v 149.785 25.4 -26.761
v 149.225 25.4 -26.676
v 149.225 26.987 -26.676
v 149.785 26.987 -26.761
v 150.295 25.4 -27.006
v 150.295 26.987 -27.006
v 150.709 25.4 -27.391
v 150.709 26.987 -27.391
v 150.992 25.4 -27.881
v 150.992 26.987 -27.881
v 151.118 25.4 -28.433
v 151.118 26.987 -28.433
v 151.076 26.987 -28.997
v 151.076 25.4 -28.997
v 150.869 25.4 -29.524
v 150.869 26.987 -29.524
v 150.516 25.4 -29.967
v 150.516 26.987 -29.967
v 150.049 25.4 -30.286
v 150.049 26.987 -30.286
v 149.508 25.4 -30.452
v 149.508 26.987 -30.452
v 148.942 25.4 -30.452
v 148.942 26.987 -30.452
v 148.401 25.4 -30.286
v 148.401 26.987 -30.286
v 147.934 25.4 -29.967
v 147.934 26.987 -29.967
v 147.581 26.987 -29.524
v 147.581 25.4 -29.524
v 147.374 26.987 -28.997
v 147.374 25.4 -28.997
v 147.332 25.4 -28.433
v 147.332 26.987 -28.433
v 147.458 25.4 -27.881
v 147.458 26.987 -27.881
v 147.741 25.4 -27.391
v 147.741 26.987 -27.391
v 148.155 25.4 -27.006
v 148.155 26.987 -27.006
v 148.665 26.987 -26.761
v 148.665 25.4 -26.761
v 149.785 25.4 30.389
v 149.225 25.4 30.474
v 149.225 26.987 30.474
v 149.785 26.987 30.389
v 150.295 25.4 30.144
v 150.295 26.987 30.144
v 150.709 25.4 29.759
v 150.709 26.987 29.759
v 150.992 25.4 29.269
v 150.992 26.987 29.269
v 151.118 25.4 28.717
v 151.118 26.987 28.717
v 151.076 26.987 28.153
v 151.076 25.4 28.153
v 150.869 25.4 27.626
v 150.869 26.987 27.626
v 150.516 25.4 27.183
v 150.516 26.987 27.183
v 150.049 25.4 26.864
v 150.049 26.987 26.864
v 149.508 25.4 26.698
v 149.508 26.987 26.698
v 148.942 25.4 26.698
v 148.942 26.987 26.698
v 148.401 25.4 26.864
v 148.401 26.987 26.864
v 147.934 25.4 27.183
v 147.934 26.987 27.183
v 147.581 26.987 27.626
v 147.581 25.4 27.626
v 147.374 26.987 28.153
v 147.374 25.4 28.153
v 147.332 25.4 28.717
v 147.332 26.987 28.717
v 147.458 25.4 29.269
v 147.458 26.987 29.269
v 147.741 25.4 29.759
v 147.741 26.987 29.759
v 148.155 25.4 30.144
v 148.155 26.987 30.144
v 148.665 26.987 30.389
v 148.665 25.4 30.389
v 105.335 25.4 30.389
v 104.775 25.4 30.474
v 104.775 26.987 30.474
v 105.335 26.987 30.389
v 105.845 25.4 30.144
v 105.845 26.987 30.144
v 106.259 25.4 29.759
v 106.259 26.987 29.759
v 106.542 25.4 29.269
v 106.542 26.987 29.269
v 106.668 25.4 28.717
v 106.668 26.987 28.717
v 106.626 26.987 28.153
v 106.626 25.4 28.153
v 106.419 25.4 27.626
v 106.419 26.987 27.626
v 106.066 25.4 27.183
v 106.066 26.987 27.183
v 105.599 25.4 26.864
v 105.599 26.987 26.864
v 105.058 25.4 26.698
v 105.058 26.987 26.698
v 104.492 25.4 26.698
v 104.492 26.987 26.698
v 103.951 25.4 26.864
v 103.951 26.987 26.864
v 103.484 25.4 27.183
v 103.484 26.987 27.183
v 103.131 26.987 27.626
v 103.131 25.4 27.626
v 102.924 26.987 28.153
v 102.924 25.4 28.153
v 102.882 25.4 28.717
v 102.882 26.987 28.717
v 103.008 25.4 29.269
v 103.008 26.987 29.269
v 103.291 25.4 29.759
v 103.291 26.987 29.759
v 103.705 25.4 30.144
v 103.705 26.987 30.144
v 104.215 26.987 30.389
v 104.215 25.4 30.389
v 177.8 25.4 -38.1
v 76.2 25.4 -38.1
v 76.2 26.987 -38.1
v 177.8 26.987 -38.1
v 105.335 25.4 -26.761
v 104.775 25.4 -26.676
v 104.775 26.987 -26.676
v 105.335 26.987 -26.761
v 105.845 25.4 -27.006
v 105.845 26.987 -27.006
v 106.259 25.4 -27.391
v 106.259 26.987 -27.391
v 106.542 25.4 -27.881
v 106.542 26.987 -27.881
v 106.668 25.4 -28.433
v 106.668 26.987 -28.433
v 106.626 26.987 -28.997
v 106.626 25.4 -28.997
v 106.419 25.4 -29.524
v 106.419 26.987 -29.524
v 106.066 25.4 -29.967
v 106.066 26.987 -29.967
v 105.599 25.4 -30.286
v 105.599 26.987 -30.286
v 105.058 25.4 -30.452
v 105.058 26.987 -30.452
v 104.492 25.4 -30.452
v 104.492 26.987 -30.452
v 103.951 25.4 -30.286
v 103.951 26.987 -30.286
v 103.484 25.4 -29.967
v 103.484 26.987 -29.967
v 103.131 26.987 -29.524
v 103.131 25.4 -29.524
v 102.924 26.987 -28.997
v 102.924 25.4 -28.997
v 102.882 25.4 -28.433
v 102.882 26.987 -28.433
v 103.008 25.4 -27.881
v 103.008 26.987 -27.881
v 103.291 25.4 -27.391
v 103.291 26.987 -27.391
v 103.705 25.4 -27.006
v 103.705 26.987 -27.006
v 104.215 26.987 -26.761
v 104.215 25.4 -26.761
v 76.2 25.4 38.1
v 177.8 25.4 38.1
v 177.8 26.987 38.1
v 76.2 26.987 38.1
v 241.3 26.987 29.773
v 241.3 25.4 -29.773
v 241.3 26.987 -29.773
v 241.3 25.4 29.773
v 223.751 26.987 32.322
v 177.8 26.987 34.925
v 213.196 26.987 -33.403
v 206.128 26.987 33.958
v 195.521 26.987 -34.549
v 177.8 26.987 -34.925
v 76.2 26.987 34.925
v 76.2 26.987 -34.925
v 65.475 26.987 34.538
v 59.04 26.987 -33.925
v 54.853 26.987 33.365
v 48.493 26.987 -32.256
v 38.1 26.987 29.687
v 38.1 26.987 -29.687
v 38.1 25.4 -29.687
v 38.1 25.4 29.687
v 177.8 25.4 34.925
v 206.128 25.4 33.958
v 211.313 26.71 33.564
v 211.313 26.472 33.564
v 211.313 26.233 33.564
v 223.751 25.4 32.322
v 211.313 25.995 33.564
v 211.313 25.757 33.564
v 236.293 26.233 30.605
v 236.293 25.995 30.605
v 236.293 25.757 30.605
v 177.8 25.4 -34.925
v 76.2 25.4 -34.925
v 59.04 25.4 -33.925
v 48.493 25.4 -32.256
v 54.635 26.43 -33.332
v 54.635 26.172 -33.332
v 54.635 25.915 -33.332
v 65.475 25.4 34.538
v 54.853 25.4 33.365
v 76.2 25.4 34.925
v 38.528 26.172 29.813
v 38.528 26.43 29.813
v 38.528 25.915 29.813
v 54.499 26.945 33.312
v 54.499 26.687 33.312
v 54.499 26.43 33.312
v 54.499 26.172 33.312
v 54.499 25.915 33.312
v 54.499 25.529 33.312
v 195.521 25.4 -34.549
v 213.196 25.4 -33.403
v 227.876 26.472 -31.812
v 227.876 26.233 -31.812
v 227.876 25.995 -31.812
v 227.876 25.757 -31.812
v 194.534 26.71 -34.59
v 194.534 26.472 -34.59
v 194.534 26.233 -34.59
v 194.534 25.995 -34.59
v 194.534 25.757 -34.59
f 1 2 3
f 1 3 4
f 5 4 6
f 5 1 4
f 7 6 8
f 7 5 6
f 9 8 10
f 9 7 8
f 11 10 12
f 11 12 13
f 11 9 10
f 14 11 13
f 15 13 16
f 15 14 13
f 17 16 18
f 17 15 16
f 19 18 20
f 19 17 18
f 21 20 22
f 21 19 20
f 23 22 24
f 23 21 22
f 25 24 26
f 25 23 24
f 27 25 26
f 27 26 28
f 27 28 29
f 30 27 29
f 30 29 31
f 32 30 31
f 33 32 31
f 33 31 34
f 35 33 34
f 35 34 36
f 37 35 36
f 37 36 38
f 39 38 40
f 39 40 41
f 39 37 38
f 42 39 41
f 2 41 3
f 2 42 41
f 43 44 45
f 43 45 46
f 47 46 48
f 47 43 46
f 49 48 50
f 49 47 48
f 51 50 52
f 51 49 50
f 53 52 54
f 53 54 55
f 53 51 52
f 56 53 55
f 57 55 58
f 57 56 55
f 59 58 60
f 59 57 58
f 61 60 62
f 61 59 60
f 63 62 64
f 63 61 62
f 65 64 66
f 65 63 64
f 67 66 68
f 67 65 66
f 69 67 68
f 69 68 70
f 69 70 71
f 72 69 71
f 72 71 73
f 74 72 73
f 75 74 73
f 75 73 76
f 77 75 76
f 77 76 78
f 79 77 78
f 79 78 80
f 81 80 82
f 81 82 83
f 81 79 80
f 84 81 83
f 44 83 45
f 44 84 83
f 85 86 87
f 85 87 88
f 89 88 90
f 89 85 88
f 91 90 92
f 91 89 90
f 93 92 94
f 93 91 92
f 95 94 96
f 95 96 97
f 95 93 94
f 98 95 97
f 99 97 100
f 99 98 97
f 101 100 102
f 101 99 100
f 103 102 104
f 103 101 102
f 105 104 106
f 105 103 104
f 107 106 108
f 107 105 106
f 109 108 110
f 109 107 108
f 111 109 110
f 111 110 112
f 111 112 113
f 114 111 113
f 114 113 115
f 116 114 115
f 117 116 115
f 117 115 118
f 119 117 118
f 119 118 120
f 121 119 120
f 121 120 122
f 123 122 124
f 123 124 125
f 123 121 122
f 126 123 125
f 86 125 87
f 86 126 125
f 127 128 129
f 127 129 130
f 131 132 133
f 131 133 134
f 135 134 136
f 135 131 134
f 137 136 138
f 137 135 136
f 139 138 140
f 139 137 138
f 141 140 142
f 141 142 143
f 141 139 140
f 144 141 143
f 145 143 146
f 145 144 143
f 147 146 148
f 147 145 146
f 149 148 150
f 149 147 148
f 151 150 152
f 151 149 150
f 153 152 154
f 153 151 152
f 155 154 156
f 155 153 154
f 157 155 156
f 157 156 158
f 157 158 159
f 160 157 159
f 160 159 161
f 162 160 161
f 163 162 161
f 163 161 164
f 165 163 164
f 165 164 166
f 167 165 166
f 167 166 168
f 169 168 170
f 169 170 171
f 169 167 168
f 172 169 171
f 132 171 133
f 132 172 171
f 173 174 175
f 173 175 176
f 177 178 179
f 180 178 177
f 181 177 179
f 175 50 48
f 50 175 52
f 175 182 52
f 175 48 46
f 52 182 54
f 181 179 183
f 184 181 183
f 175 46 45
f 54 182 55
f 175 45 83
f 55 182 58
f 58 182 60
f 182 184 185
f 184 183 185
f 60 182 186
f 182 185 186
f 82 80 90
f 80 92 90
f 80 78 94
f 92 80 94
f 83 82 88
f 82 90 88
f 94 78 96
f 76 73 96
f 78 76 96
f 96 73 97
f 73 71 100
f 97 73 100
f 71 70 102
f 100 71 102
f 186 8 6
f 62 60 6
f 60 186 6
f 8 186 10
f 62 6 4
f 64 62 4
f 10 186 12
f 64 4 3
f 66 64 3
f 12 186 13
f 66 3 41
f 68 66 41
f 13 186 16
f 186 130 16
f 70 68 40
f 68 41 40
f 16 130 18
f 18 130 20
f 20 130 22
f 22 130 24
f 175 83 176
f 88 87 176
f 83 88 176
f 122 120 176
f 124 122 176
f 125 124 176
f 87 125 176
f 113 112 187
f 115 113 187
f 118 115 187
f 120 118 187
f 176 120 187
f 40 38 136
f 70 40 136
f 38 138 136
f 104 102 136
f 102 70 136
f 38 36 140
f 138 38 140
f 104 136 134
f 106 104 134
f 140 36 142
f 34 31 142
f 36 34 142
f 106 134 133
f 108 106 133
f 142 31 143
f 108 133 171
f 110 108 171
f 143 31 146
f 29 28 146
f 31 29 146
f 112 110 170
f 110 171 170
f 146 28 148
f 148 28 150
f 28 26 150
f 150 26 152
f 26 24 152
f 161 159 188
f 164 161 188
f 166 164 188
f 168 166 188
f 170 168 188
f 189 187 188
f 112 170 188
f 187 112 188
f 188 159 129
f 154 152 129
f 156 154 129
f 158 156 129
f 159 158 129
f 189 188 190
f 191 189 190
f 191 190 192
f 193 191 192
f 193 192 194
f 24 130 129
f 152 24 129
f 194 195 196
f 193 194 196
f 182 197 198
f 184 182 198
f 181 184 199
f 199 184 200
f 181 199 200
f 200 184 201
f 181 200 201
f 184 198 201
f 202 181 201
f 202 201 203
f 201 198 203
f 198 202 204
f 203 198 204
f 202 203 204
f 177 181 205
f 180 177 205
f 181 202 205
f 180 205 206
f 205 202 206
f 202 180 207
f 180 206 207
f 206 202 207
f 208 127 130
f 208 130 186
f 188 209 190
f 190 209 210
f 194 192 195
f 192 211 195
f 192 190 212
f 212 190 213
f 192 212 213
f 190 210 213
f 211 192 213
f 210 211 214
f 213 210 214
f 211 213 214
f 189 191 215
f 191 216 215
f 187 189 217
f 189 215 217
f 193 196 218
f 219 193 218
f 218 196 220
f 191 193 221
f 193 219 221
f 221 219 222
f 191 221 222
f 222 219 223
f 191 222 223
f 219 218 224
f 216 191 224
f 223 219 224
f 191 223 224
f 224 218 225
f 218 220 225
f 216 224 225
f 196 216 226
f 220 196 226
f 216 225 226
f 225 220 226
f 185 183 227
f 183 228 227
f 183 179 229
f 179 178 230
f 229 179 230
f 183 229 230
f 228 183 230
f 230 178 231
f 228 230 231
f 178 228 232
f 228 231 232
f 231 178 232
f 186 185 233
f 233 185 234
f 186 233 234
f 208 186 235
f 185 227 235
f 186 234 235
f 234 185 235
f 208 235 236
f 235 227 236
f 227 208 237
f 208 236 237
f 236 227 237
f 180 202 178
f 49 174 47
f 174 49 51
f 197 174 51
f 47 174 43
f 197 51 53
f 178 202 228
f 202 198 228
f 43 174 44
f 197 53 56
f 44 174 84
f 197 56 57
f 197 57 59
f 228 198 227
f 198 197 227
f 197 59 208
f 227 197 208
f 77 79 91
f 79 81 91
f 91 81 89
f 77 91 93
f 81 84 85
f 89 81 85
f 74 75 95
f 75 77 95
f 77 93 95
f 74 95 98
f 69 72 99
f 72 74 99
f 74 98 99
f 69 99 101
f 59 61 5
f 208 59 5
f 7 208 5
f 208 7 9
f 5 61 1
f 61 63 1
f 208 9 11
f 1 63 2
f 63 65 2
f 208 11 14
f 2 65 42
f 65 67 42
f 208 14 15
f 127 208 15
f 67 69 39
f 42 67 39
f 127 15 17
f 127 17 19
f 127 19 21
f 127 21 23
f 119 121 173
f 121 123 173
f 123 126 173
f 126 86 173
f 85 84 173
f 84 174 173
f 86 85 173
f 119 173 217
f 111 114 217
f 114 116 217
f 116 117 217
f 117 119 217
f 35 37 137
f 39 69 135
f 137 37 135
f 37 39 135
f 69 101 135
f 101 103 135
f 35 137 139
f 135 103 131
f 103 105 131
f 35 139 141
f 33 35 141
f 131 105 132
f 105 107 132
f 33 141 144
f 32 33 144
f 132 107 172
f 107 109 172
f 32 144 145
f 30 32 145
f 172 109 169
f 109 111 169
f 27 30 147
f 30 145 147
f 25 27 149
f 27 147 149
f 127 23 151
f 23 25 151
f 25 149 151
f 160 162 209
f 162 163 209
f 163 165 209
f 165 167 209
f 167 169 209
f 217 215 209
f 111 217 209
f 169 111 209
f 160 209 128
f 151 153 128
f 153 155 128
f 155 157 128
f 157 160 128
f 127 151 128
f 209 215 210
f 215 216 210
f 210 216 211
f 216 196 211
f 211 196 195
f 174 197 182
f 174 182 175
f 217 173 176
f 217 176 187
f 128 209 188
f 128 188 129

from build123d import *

# Parameters (mm, degrees)
BOSS_EXTRUDE1_DEPTH   = 25.4
SKETCH4_W             = 63.5
SKETCH4_H             = 76.2
CUT_EXTRUDE4_DEPTH    = 0.01
F_6_CLEARANCE_HOLE1_D = 3.7973
CUT_EXTRUDE5_DEPTH    = 3.5052
SKETCH8_R             = 1.89865
BOSS_EXTRUDE2_DEPTH   = 1.5875
SKETCH9_W             = 83.512513563
SKETCH9_H             = 26.66457596
CUT_EXTRUDE7_DEPTH    = 309.355274367
SKETCH10_W            = 76.2
SKETCH10_H            = 78.034990754
SKETCH10_W_2          = 120.649995745
SKETCH10_H_2          = 89.760717872
CUT_EXTRUDE8_DEPTH    = 305.02593568


with BuildPart() as part:
    # Sketch1 → Boss-Extrude1 (new body)
    with BuildSketch(Plane(origin=(0, 0, 0), x_dir=(1, 0, 0), z_dir=(0, 1, 0))):
        with BuildLine():
            Line((76.2, 38.1), (177.8, 38.1))
            add(Edge.make_bspline(
                [(177.8, -38.1), (304.8, -38.1), (304.8, 0), (304.8, 38.1), (177.8, 38.1)],
                knots=[4.71238898, 4.71238898, 4.71238898, 6.283185307, 6.283185307, 7.853981634, 7.853981634, 7.853981634], degree=2, weights=[1, 0.707106781, 1, 0.707106781, 1]))
            Line((177.8, -38.1), (76.2, -38.1))
            add(Edge.make_bspline(
                [(76.2, 38.1), (0, 38.1), (0, 0), (0, -38.1), (76.2, -38.1)],
                knots=[4.71238898, 4.71238898, 4.71238898, 6.283185307, 6.283185307, 7.853981634, 7.853981634, 7.853981634], degree=2, weights=[1, 0.707106781, 1, 0.707106781, 1]))
        make_face()
    extrude(amount=BOSS_EXTRUDE1_DEPTH)

    # Sketch4 → Cut-Extrude4 (cut)
    with BuildSketch(Plane.XZ):
        with Locations((107.95, 0)):
            Rectangle(SKETCH4_W, SKETCH4_H)
    extrude(amount=-CUT_EXTRUDE4_DEPTH, mode=Mode.SUBTRACT)

    # #6 Clearance Hole1 (through all)
    with Locations(Plane(origin=(0, 25.4, 0), x_dir=(1, 0, 0), z_dir=(0, 1, 0))):
        with Locations((104.775, 28.575), (149.225, 28.575), (149.225, -28.575), (104.775, -28.575)):
            Hole(F_6_CLEARANCE_HOLE1_D / 2)

    # Sketch7 → Cut-Extrude5 (cut)
    with BuildSketch(Plane(origin=(0, 25.4, 0), x_dir=(1, 0, 0), z_dir=(0, 1, 0))):
        Polygon((144.092356107, 28.575), (146.658678053, 24.13), (151.791321947, 24.13), (154.357643893, 28.575), (151.791321947, 33.02), (146.658678053, 33.02), align=None)
        Polygon((144.092356107, -28.575), (146.658678053, -33.02), (151.791321947, -33.02), (154.357643893, -28.575), (151.791321947, -24.13), (146.658678053, -24.13), align=None)
        Polygon((99.642356107, -28.575), (102.208678053, -33.02), (107.341321947, -33.02), (109.907643893, -28.575), (107.341321947, -24.13), (102.208678053, -24.13), align=None)
        Polygon((99.642356107, 28.575), (102.208678053, 24.13), (107.341321947, 24.13), (109.907643893, 28.575), (107.341321947, 33.02), (102.208678053, 33.02), align=None)
    extrude(amount=-CUT_EXTRUDE5_DEPTH, mode=Mode.SUBTRACT)

    # Sketch8 → Boss-Extrude2 (add)
    with BuildSketch(Plane(origin=(0, 25.4, 0), x_dir=(1, 0, 0), z_dir=(0, 1, 0))):
        with BuildLine():
            Line((76.2, 34.925), (76.2, 38.1))
            Line((76.2, 38.1), (177.8, 38.1))
            Line((177.8, 38.1), (177.8, 34.925))
            add(Edge.make_bspline(
                [(177.8, -34.925), (183.4037084, -34.925), (188.998492342, -34.813401269), (200.169898566, -34.363095557), (205.746528757, -34.024487469), (216.880255629, -33.103008305), (222.437375795, -32.520430902), (230.75625716, -31.436497802), (233.526404303, -31.040006826), (239.060480939, -30.169274267), (241.826062226, -29.694714405), (250.088902803, -28.143630441), (255.558584053, -26.942274462), (262.328557631, -25.151722447), (263.679135198, -24.778907782), (266.372677584, -24.000520191), (267.71682163, -23.594573907), (271.725857042, -22.324580042), (274.36743953, -21.409387606), (279.569151408, -19.39956311), (282.129804397, -18.306084526), (285.88296458, -16.472402408), (287.119225286, -15.828587024), (289.55372457, -14.457194234), (290.752112946, -13.729946828), (293.096789788, -12.16067691), (294.246150852, -11.316137328), (295.874693947, -9.951173652), (296.402758109, -9.47890107), (297.421867434, -8.491073847), (297.913370929, -7.974720766), (298.834097865, -6.902845016), (299.265206405, -6.34585568), (300.051083084, -5.176943461), (300.406626859, -4.564345705), (301.008906586, -3.265877479), (301.246986609, -2.597792892), (301.485043085, -1.560074348), (301.544634961, -1.206113764), (301.617830117, -0.494585391), (301.644885041, 0.214202137), (301.581423052, 0.917612733), (301.474094585, 1.618417551), (301.397802992, 1.969801613), (301.111287523, 3.001503382), (300.846416268, 3.65704054), (300.206739898, 4.920093421), (299.828668717, 5.531043925), (299.007148253, 6.686383823), (298.562585264, 7.234082094), (297.622788002, 8.284550248), (297.127404223, 8.787187569), (296.096077792, 9.756500131), (295.558527194, 10.224239157), (293.916424424, 11.566158841), (292.777517596, 12.385848353), (290.439906756, 13.923799855), (289.240807105, 14.641390764), (286.797257835, 15.999650314), (285.552669877, 16.640084306), (283.027180157, 17.859357093), (281.744712958, 18.438732265), (279.156163214, 19.543403236), (277.854905585, 20.066703794), (273.933809615, 21.564574536), (271.296832059, 22.467878334), (265.988924804, 24.133309881), (263.317871138, 24.894922167), (255.263773486, 27.00954075), (249.84032756, 28.194552175), (238.914613399, 30.236824809), (233.411910816, 31.092279963), (225.108785934, 32.171421056), (222.333695526, 32.496639974), (216.783621708, 33.081533661), (214.006661761, 33.341462159), (205.670357358, 34.029518973), (200.105614733, 34.366364864), (188.962770448, 34.814156957), (183.384662687, 34.925), (177.8, 34.925)],
                knots=[0, 0, 0, 0, 0.0625, 0.0625, 0.125, 0.125, 0.1875, 0.1875, 0.21875, 0.21875, 0.25, 0.25, 0.3125, 0.3125, 0.328125, 0.328125, 0.34375, 0.34375, 0.375, 0.375, 0.40625, 0.40625, 0.421875, 0.421875, 0.4375, 0.4375, 0.453125, 0.453125, 0.4609375, 0.4609375, 0.46875, 0.46875, 0.4765625, 0.4765625, 0.484375, 0.484375, 0.4921875, 0.4921875, 0.49609375, 0.49609375, 0.5, 0.50390625, 0.50390625, 0.5078125, 0.5078125, 0.515625, 0.515625, 0.5234375, 0.5234375, 0.53125, 0.53125, 0.5390625, 0.5390625, 0.546875, 0.546875, 0.5625, 0.5625, 0.578125, 0.578125, 0.59375, 0.59375, 0.609375, 0.609375, 0.625, 0.625, 0.65625, 0.65625, 0.6875, 0.6875, 0.75, 0.75, 0.8125, 0.8125, 0.84375, 0.84375, 0.875, 0.875, 0.9375, 0.9375, 1, 1, 1, 1], degree=3))
            Line((177.8, -34.925), (177.8, -38.1))
            Line((177.8, -38.1), (76.2, -38.1))
            Line((76.2, -38.1), (76.2, -34.925))
            add(Edge.make_bspline(
                [(76.2, 34.925), (72.560356463, 34.925), (68.943360269, 34.792561899), (61.754441862, 34.264100128), (58.182504946, 33.868162444), (51.086537454, 32.796138329), (47.562444107, 32.120418968), (40.569083399, 30.448366491), (37.099631765, 29.453110976), (32.806027277, 27.95635597), (31.949494882, 27.644206952), (30.241174952, 26.992161717), (29.390926264, 26.65279755), (26.866144113, 25.597394738), (25.212373464, 24.842354074), (21.972821409, 23.213388071), (20.386939209, 22.339638978), (17.297386897, 20.44838632), (15.793478172, 19.43129999), (13.617299122, 17.766336528), (12.904682274, 17.187440617), (11.513561893, 15.976499308), (10.840880513, 15.349552385), (9.54783147, 14.046551814), (8.927423545, 13.37053596), (8.042889277, 12.313259261), (7.755748062, 11.953602405), (7.198395375, 11.218396794), (6.928446634, 10.843070732), (5.637961842, 8.942133597), (4.781011076, 7.331767424), (4.011479694, 5.164717753), (3.872393075, 4.721427518), (3.630991775, 3.828466268), (3.528746677, 3.379752125), (3.278693467, 2.026749947), (3.187494563, 1.115610982), (3.170545544, -0.265601808), (3.185103724, -0.730659272), (3.254432294, -1.653608423), (3.308896513, -2.110722742), (3.528648511, -3.46965449), (3.750177803, -4.359086655), (4.185155464, -5.670622337), (4.348017487, -6.105682935), (4.702753212, -6.959314098), (4.89428858, -7.377540069), (5.507317523, -8.608922615), (5.967053776, -9.398893053), (6.972472791, -10.926725455), (7.518232478, -11.66454078), (8.684660756, -13.094754944), (9.299817788, -13.780178654), (11.212125162, -15.748333857), (12.581059513, -16.950990578), (14.739480167, -18.63278064), (15.476712229, -19.172714409), (16.982909755, -20.215658543), (17.753757316, -20.719762644), (20.090686263, -22.170309278), (21.683208327, -23.057695262), (26.543466505, -25.529337744), (29.892801319, -26.925597609), (35.037930237, -28.740921547), (36.773547574, -29.298627898), (39.40495658, -30.070716914), (40.286457068, -30.317183729), (42.05035166, -30.787397156), (42.933764127, -31.011448076), (47.357777286, -32.079253653), (50.919045806, -32.767054426), (58.079539287, -33.856246888), (61.678822068, -34.257202279), (68.912834907, -34.79163745), (72.5475805, -34.925), (76.2, -34.925)],
                knots=[0, 0, 0, 0, 0.0625, 0.0625, 0.125, 0.125, 0.1875, 0.1875, 0.25, 0.25, 0.265625, 0.265625, 0.28125, 0.28125, 0.3125, 0.3125, 0.34375, 0.34375, 0.375, 0.375, 0.390625, 0.390625, 0.40625, 0.40625, 0.421875, 0.421875, 0.4296875, 0.4296875, 0.4375, 0.4375, 0.46875, 0.46875, 0.4765625, 0.4765625, 0.484375, 0.484375, 0.5, 0.5, 0.5078125, 0.5078125, 0.515625, 0.515625, 0.53125, 0.53125, 0.5390625, 0.5390625, 0.546875, 0.546875, 0.5625, 0.5625, 0.578125, 0.578125, 0.59375, 0.59375, 0.625, 0.625, 0.640625, 0.640625, 0.65625, 0.65625, 0.6875, 0.6875, 0.75, 0.75, 0.78125, 0.78125, 0.796875, 0.796875, 0.8125, 0.8125, 0.875, 0.875, 0.9375, 0.9375, 1, 1, 1, 1], degree=3))
        make_face()
        with Locations(Location((149.225, 28.575, 0), (0, 0, 270))):
            Circle(SKETCH8_R, mode=Mode.SUBTRACT)
        with Locations(Location((149.225, -28.575, 0), (0, 0, 270))):
            Circle(SKETCH8_R, mode=Mode.SUBTRACT)
        with Locations(Location((104.775, -28.575, 0), (0, 0, 270))):
            Circle(SKETCH8_R, mode=Mode.SUBTRACT)
        with Locations(Location((104.775, 28.575, 0), (0, 0, 270))):
            Circle(SKETCH8_R, mode=Mode.SUBTRACT)
    extrude(amount=BOSS_EXTRUDE2_DEPTH)

    # Sketch9 → Cut-Extrude7 (cut, through all)
    with BuildSketch(Plane(origin=(0, 0, 0), x_dir=(0, 0, -1), z_dir=(1, 0, 0))):
        with Locations((0.469171425, 12.06771202)):
            Rectangle(SKETCH9_W, SKETCH9_H)
    extrude(amount=CUT_EXTRUDE7_DEPTH, mode=Mode.SUBTRACT)

    # Sketch10 → Cut-Extrude8 (cut, through all)
    with BuildSketch(Plane.XZ.offset(-25.4)):
        Rectangle(SKETCH10_W, SKETCH10_H)
        with Locations((301.624997872, -0.000109313)):
            Rectangle(SKETCH10_W_2, SKETCH10_H_2)
    extrude(amount=-CUT_EXTRUDE8_DEPTH, mode=Mode.SUBTRACT)


solid = part.part
